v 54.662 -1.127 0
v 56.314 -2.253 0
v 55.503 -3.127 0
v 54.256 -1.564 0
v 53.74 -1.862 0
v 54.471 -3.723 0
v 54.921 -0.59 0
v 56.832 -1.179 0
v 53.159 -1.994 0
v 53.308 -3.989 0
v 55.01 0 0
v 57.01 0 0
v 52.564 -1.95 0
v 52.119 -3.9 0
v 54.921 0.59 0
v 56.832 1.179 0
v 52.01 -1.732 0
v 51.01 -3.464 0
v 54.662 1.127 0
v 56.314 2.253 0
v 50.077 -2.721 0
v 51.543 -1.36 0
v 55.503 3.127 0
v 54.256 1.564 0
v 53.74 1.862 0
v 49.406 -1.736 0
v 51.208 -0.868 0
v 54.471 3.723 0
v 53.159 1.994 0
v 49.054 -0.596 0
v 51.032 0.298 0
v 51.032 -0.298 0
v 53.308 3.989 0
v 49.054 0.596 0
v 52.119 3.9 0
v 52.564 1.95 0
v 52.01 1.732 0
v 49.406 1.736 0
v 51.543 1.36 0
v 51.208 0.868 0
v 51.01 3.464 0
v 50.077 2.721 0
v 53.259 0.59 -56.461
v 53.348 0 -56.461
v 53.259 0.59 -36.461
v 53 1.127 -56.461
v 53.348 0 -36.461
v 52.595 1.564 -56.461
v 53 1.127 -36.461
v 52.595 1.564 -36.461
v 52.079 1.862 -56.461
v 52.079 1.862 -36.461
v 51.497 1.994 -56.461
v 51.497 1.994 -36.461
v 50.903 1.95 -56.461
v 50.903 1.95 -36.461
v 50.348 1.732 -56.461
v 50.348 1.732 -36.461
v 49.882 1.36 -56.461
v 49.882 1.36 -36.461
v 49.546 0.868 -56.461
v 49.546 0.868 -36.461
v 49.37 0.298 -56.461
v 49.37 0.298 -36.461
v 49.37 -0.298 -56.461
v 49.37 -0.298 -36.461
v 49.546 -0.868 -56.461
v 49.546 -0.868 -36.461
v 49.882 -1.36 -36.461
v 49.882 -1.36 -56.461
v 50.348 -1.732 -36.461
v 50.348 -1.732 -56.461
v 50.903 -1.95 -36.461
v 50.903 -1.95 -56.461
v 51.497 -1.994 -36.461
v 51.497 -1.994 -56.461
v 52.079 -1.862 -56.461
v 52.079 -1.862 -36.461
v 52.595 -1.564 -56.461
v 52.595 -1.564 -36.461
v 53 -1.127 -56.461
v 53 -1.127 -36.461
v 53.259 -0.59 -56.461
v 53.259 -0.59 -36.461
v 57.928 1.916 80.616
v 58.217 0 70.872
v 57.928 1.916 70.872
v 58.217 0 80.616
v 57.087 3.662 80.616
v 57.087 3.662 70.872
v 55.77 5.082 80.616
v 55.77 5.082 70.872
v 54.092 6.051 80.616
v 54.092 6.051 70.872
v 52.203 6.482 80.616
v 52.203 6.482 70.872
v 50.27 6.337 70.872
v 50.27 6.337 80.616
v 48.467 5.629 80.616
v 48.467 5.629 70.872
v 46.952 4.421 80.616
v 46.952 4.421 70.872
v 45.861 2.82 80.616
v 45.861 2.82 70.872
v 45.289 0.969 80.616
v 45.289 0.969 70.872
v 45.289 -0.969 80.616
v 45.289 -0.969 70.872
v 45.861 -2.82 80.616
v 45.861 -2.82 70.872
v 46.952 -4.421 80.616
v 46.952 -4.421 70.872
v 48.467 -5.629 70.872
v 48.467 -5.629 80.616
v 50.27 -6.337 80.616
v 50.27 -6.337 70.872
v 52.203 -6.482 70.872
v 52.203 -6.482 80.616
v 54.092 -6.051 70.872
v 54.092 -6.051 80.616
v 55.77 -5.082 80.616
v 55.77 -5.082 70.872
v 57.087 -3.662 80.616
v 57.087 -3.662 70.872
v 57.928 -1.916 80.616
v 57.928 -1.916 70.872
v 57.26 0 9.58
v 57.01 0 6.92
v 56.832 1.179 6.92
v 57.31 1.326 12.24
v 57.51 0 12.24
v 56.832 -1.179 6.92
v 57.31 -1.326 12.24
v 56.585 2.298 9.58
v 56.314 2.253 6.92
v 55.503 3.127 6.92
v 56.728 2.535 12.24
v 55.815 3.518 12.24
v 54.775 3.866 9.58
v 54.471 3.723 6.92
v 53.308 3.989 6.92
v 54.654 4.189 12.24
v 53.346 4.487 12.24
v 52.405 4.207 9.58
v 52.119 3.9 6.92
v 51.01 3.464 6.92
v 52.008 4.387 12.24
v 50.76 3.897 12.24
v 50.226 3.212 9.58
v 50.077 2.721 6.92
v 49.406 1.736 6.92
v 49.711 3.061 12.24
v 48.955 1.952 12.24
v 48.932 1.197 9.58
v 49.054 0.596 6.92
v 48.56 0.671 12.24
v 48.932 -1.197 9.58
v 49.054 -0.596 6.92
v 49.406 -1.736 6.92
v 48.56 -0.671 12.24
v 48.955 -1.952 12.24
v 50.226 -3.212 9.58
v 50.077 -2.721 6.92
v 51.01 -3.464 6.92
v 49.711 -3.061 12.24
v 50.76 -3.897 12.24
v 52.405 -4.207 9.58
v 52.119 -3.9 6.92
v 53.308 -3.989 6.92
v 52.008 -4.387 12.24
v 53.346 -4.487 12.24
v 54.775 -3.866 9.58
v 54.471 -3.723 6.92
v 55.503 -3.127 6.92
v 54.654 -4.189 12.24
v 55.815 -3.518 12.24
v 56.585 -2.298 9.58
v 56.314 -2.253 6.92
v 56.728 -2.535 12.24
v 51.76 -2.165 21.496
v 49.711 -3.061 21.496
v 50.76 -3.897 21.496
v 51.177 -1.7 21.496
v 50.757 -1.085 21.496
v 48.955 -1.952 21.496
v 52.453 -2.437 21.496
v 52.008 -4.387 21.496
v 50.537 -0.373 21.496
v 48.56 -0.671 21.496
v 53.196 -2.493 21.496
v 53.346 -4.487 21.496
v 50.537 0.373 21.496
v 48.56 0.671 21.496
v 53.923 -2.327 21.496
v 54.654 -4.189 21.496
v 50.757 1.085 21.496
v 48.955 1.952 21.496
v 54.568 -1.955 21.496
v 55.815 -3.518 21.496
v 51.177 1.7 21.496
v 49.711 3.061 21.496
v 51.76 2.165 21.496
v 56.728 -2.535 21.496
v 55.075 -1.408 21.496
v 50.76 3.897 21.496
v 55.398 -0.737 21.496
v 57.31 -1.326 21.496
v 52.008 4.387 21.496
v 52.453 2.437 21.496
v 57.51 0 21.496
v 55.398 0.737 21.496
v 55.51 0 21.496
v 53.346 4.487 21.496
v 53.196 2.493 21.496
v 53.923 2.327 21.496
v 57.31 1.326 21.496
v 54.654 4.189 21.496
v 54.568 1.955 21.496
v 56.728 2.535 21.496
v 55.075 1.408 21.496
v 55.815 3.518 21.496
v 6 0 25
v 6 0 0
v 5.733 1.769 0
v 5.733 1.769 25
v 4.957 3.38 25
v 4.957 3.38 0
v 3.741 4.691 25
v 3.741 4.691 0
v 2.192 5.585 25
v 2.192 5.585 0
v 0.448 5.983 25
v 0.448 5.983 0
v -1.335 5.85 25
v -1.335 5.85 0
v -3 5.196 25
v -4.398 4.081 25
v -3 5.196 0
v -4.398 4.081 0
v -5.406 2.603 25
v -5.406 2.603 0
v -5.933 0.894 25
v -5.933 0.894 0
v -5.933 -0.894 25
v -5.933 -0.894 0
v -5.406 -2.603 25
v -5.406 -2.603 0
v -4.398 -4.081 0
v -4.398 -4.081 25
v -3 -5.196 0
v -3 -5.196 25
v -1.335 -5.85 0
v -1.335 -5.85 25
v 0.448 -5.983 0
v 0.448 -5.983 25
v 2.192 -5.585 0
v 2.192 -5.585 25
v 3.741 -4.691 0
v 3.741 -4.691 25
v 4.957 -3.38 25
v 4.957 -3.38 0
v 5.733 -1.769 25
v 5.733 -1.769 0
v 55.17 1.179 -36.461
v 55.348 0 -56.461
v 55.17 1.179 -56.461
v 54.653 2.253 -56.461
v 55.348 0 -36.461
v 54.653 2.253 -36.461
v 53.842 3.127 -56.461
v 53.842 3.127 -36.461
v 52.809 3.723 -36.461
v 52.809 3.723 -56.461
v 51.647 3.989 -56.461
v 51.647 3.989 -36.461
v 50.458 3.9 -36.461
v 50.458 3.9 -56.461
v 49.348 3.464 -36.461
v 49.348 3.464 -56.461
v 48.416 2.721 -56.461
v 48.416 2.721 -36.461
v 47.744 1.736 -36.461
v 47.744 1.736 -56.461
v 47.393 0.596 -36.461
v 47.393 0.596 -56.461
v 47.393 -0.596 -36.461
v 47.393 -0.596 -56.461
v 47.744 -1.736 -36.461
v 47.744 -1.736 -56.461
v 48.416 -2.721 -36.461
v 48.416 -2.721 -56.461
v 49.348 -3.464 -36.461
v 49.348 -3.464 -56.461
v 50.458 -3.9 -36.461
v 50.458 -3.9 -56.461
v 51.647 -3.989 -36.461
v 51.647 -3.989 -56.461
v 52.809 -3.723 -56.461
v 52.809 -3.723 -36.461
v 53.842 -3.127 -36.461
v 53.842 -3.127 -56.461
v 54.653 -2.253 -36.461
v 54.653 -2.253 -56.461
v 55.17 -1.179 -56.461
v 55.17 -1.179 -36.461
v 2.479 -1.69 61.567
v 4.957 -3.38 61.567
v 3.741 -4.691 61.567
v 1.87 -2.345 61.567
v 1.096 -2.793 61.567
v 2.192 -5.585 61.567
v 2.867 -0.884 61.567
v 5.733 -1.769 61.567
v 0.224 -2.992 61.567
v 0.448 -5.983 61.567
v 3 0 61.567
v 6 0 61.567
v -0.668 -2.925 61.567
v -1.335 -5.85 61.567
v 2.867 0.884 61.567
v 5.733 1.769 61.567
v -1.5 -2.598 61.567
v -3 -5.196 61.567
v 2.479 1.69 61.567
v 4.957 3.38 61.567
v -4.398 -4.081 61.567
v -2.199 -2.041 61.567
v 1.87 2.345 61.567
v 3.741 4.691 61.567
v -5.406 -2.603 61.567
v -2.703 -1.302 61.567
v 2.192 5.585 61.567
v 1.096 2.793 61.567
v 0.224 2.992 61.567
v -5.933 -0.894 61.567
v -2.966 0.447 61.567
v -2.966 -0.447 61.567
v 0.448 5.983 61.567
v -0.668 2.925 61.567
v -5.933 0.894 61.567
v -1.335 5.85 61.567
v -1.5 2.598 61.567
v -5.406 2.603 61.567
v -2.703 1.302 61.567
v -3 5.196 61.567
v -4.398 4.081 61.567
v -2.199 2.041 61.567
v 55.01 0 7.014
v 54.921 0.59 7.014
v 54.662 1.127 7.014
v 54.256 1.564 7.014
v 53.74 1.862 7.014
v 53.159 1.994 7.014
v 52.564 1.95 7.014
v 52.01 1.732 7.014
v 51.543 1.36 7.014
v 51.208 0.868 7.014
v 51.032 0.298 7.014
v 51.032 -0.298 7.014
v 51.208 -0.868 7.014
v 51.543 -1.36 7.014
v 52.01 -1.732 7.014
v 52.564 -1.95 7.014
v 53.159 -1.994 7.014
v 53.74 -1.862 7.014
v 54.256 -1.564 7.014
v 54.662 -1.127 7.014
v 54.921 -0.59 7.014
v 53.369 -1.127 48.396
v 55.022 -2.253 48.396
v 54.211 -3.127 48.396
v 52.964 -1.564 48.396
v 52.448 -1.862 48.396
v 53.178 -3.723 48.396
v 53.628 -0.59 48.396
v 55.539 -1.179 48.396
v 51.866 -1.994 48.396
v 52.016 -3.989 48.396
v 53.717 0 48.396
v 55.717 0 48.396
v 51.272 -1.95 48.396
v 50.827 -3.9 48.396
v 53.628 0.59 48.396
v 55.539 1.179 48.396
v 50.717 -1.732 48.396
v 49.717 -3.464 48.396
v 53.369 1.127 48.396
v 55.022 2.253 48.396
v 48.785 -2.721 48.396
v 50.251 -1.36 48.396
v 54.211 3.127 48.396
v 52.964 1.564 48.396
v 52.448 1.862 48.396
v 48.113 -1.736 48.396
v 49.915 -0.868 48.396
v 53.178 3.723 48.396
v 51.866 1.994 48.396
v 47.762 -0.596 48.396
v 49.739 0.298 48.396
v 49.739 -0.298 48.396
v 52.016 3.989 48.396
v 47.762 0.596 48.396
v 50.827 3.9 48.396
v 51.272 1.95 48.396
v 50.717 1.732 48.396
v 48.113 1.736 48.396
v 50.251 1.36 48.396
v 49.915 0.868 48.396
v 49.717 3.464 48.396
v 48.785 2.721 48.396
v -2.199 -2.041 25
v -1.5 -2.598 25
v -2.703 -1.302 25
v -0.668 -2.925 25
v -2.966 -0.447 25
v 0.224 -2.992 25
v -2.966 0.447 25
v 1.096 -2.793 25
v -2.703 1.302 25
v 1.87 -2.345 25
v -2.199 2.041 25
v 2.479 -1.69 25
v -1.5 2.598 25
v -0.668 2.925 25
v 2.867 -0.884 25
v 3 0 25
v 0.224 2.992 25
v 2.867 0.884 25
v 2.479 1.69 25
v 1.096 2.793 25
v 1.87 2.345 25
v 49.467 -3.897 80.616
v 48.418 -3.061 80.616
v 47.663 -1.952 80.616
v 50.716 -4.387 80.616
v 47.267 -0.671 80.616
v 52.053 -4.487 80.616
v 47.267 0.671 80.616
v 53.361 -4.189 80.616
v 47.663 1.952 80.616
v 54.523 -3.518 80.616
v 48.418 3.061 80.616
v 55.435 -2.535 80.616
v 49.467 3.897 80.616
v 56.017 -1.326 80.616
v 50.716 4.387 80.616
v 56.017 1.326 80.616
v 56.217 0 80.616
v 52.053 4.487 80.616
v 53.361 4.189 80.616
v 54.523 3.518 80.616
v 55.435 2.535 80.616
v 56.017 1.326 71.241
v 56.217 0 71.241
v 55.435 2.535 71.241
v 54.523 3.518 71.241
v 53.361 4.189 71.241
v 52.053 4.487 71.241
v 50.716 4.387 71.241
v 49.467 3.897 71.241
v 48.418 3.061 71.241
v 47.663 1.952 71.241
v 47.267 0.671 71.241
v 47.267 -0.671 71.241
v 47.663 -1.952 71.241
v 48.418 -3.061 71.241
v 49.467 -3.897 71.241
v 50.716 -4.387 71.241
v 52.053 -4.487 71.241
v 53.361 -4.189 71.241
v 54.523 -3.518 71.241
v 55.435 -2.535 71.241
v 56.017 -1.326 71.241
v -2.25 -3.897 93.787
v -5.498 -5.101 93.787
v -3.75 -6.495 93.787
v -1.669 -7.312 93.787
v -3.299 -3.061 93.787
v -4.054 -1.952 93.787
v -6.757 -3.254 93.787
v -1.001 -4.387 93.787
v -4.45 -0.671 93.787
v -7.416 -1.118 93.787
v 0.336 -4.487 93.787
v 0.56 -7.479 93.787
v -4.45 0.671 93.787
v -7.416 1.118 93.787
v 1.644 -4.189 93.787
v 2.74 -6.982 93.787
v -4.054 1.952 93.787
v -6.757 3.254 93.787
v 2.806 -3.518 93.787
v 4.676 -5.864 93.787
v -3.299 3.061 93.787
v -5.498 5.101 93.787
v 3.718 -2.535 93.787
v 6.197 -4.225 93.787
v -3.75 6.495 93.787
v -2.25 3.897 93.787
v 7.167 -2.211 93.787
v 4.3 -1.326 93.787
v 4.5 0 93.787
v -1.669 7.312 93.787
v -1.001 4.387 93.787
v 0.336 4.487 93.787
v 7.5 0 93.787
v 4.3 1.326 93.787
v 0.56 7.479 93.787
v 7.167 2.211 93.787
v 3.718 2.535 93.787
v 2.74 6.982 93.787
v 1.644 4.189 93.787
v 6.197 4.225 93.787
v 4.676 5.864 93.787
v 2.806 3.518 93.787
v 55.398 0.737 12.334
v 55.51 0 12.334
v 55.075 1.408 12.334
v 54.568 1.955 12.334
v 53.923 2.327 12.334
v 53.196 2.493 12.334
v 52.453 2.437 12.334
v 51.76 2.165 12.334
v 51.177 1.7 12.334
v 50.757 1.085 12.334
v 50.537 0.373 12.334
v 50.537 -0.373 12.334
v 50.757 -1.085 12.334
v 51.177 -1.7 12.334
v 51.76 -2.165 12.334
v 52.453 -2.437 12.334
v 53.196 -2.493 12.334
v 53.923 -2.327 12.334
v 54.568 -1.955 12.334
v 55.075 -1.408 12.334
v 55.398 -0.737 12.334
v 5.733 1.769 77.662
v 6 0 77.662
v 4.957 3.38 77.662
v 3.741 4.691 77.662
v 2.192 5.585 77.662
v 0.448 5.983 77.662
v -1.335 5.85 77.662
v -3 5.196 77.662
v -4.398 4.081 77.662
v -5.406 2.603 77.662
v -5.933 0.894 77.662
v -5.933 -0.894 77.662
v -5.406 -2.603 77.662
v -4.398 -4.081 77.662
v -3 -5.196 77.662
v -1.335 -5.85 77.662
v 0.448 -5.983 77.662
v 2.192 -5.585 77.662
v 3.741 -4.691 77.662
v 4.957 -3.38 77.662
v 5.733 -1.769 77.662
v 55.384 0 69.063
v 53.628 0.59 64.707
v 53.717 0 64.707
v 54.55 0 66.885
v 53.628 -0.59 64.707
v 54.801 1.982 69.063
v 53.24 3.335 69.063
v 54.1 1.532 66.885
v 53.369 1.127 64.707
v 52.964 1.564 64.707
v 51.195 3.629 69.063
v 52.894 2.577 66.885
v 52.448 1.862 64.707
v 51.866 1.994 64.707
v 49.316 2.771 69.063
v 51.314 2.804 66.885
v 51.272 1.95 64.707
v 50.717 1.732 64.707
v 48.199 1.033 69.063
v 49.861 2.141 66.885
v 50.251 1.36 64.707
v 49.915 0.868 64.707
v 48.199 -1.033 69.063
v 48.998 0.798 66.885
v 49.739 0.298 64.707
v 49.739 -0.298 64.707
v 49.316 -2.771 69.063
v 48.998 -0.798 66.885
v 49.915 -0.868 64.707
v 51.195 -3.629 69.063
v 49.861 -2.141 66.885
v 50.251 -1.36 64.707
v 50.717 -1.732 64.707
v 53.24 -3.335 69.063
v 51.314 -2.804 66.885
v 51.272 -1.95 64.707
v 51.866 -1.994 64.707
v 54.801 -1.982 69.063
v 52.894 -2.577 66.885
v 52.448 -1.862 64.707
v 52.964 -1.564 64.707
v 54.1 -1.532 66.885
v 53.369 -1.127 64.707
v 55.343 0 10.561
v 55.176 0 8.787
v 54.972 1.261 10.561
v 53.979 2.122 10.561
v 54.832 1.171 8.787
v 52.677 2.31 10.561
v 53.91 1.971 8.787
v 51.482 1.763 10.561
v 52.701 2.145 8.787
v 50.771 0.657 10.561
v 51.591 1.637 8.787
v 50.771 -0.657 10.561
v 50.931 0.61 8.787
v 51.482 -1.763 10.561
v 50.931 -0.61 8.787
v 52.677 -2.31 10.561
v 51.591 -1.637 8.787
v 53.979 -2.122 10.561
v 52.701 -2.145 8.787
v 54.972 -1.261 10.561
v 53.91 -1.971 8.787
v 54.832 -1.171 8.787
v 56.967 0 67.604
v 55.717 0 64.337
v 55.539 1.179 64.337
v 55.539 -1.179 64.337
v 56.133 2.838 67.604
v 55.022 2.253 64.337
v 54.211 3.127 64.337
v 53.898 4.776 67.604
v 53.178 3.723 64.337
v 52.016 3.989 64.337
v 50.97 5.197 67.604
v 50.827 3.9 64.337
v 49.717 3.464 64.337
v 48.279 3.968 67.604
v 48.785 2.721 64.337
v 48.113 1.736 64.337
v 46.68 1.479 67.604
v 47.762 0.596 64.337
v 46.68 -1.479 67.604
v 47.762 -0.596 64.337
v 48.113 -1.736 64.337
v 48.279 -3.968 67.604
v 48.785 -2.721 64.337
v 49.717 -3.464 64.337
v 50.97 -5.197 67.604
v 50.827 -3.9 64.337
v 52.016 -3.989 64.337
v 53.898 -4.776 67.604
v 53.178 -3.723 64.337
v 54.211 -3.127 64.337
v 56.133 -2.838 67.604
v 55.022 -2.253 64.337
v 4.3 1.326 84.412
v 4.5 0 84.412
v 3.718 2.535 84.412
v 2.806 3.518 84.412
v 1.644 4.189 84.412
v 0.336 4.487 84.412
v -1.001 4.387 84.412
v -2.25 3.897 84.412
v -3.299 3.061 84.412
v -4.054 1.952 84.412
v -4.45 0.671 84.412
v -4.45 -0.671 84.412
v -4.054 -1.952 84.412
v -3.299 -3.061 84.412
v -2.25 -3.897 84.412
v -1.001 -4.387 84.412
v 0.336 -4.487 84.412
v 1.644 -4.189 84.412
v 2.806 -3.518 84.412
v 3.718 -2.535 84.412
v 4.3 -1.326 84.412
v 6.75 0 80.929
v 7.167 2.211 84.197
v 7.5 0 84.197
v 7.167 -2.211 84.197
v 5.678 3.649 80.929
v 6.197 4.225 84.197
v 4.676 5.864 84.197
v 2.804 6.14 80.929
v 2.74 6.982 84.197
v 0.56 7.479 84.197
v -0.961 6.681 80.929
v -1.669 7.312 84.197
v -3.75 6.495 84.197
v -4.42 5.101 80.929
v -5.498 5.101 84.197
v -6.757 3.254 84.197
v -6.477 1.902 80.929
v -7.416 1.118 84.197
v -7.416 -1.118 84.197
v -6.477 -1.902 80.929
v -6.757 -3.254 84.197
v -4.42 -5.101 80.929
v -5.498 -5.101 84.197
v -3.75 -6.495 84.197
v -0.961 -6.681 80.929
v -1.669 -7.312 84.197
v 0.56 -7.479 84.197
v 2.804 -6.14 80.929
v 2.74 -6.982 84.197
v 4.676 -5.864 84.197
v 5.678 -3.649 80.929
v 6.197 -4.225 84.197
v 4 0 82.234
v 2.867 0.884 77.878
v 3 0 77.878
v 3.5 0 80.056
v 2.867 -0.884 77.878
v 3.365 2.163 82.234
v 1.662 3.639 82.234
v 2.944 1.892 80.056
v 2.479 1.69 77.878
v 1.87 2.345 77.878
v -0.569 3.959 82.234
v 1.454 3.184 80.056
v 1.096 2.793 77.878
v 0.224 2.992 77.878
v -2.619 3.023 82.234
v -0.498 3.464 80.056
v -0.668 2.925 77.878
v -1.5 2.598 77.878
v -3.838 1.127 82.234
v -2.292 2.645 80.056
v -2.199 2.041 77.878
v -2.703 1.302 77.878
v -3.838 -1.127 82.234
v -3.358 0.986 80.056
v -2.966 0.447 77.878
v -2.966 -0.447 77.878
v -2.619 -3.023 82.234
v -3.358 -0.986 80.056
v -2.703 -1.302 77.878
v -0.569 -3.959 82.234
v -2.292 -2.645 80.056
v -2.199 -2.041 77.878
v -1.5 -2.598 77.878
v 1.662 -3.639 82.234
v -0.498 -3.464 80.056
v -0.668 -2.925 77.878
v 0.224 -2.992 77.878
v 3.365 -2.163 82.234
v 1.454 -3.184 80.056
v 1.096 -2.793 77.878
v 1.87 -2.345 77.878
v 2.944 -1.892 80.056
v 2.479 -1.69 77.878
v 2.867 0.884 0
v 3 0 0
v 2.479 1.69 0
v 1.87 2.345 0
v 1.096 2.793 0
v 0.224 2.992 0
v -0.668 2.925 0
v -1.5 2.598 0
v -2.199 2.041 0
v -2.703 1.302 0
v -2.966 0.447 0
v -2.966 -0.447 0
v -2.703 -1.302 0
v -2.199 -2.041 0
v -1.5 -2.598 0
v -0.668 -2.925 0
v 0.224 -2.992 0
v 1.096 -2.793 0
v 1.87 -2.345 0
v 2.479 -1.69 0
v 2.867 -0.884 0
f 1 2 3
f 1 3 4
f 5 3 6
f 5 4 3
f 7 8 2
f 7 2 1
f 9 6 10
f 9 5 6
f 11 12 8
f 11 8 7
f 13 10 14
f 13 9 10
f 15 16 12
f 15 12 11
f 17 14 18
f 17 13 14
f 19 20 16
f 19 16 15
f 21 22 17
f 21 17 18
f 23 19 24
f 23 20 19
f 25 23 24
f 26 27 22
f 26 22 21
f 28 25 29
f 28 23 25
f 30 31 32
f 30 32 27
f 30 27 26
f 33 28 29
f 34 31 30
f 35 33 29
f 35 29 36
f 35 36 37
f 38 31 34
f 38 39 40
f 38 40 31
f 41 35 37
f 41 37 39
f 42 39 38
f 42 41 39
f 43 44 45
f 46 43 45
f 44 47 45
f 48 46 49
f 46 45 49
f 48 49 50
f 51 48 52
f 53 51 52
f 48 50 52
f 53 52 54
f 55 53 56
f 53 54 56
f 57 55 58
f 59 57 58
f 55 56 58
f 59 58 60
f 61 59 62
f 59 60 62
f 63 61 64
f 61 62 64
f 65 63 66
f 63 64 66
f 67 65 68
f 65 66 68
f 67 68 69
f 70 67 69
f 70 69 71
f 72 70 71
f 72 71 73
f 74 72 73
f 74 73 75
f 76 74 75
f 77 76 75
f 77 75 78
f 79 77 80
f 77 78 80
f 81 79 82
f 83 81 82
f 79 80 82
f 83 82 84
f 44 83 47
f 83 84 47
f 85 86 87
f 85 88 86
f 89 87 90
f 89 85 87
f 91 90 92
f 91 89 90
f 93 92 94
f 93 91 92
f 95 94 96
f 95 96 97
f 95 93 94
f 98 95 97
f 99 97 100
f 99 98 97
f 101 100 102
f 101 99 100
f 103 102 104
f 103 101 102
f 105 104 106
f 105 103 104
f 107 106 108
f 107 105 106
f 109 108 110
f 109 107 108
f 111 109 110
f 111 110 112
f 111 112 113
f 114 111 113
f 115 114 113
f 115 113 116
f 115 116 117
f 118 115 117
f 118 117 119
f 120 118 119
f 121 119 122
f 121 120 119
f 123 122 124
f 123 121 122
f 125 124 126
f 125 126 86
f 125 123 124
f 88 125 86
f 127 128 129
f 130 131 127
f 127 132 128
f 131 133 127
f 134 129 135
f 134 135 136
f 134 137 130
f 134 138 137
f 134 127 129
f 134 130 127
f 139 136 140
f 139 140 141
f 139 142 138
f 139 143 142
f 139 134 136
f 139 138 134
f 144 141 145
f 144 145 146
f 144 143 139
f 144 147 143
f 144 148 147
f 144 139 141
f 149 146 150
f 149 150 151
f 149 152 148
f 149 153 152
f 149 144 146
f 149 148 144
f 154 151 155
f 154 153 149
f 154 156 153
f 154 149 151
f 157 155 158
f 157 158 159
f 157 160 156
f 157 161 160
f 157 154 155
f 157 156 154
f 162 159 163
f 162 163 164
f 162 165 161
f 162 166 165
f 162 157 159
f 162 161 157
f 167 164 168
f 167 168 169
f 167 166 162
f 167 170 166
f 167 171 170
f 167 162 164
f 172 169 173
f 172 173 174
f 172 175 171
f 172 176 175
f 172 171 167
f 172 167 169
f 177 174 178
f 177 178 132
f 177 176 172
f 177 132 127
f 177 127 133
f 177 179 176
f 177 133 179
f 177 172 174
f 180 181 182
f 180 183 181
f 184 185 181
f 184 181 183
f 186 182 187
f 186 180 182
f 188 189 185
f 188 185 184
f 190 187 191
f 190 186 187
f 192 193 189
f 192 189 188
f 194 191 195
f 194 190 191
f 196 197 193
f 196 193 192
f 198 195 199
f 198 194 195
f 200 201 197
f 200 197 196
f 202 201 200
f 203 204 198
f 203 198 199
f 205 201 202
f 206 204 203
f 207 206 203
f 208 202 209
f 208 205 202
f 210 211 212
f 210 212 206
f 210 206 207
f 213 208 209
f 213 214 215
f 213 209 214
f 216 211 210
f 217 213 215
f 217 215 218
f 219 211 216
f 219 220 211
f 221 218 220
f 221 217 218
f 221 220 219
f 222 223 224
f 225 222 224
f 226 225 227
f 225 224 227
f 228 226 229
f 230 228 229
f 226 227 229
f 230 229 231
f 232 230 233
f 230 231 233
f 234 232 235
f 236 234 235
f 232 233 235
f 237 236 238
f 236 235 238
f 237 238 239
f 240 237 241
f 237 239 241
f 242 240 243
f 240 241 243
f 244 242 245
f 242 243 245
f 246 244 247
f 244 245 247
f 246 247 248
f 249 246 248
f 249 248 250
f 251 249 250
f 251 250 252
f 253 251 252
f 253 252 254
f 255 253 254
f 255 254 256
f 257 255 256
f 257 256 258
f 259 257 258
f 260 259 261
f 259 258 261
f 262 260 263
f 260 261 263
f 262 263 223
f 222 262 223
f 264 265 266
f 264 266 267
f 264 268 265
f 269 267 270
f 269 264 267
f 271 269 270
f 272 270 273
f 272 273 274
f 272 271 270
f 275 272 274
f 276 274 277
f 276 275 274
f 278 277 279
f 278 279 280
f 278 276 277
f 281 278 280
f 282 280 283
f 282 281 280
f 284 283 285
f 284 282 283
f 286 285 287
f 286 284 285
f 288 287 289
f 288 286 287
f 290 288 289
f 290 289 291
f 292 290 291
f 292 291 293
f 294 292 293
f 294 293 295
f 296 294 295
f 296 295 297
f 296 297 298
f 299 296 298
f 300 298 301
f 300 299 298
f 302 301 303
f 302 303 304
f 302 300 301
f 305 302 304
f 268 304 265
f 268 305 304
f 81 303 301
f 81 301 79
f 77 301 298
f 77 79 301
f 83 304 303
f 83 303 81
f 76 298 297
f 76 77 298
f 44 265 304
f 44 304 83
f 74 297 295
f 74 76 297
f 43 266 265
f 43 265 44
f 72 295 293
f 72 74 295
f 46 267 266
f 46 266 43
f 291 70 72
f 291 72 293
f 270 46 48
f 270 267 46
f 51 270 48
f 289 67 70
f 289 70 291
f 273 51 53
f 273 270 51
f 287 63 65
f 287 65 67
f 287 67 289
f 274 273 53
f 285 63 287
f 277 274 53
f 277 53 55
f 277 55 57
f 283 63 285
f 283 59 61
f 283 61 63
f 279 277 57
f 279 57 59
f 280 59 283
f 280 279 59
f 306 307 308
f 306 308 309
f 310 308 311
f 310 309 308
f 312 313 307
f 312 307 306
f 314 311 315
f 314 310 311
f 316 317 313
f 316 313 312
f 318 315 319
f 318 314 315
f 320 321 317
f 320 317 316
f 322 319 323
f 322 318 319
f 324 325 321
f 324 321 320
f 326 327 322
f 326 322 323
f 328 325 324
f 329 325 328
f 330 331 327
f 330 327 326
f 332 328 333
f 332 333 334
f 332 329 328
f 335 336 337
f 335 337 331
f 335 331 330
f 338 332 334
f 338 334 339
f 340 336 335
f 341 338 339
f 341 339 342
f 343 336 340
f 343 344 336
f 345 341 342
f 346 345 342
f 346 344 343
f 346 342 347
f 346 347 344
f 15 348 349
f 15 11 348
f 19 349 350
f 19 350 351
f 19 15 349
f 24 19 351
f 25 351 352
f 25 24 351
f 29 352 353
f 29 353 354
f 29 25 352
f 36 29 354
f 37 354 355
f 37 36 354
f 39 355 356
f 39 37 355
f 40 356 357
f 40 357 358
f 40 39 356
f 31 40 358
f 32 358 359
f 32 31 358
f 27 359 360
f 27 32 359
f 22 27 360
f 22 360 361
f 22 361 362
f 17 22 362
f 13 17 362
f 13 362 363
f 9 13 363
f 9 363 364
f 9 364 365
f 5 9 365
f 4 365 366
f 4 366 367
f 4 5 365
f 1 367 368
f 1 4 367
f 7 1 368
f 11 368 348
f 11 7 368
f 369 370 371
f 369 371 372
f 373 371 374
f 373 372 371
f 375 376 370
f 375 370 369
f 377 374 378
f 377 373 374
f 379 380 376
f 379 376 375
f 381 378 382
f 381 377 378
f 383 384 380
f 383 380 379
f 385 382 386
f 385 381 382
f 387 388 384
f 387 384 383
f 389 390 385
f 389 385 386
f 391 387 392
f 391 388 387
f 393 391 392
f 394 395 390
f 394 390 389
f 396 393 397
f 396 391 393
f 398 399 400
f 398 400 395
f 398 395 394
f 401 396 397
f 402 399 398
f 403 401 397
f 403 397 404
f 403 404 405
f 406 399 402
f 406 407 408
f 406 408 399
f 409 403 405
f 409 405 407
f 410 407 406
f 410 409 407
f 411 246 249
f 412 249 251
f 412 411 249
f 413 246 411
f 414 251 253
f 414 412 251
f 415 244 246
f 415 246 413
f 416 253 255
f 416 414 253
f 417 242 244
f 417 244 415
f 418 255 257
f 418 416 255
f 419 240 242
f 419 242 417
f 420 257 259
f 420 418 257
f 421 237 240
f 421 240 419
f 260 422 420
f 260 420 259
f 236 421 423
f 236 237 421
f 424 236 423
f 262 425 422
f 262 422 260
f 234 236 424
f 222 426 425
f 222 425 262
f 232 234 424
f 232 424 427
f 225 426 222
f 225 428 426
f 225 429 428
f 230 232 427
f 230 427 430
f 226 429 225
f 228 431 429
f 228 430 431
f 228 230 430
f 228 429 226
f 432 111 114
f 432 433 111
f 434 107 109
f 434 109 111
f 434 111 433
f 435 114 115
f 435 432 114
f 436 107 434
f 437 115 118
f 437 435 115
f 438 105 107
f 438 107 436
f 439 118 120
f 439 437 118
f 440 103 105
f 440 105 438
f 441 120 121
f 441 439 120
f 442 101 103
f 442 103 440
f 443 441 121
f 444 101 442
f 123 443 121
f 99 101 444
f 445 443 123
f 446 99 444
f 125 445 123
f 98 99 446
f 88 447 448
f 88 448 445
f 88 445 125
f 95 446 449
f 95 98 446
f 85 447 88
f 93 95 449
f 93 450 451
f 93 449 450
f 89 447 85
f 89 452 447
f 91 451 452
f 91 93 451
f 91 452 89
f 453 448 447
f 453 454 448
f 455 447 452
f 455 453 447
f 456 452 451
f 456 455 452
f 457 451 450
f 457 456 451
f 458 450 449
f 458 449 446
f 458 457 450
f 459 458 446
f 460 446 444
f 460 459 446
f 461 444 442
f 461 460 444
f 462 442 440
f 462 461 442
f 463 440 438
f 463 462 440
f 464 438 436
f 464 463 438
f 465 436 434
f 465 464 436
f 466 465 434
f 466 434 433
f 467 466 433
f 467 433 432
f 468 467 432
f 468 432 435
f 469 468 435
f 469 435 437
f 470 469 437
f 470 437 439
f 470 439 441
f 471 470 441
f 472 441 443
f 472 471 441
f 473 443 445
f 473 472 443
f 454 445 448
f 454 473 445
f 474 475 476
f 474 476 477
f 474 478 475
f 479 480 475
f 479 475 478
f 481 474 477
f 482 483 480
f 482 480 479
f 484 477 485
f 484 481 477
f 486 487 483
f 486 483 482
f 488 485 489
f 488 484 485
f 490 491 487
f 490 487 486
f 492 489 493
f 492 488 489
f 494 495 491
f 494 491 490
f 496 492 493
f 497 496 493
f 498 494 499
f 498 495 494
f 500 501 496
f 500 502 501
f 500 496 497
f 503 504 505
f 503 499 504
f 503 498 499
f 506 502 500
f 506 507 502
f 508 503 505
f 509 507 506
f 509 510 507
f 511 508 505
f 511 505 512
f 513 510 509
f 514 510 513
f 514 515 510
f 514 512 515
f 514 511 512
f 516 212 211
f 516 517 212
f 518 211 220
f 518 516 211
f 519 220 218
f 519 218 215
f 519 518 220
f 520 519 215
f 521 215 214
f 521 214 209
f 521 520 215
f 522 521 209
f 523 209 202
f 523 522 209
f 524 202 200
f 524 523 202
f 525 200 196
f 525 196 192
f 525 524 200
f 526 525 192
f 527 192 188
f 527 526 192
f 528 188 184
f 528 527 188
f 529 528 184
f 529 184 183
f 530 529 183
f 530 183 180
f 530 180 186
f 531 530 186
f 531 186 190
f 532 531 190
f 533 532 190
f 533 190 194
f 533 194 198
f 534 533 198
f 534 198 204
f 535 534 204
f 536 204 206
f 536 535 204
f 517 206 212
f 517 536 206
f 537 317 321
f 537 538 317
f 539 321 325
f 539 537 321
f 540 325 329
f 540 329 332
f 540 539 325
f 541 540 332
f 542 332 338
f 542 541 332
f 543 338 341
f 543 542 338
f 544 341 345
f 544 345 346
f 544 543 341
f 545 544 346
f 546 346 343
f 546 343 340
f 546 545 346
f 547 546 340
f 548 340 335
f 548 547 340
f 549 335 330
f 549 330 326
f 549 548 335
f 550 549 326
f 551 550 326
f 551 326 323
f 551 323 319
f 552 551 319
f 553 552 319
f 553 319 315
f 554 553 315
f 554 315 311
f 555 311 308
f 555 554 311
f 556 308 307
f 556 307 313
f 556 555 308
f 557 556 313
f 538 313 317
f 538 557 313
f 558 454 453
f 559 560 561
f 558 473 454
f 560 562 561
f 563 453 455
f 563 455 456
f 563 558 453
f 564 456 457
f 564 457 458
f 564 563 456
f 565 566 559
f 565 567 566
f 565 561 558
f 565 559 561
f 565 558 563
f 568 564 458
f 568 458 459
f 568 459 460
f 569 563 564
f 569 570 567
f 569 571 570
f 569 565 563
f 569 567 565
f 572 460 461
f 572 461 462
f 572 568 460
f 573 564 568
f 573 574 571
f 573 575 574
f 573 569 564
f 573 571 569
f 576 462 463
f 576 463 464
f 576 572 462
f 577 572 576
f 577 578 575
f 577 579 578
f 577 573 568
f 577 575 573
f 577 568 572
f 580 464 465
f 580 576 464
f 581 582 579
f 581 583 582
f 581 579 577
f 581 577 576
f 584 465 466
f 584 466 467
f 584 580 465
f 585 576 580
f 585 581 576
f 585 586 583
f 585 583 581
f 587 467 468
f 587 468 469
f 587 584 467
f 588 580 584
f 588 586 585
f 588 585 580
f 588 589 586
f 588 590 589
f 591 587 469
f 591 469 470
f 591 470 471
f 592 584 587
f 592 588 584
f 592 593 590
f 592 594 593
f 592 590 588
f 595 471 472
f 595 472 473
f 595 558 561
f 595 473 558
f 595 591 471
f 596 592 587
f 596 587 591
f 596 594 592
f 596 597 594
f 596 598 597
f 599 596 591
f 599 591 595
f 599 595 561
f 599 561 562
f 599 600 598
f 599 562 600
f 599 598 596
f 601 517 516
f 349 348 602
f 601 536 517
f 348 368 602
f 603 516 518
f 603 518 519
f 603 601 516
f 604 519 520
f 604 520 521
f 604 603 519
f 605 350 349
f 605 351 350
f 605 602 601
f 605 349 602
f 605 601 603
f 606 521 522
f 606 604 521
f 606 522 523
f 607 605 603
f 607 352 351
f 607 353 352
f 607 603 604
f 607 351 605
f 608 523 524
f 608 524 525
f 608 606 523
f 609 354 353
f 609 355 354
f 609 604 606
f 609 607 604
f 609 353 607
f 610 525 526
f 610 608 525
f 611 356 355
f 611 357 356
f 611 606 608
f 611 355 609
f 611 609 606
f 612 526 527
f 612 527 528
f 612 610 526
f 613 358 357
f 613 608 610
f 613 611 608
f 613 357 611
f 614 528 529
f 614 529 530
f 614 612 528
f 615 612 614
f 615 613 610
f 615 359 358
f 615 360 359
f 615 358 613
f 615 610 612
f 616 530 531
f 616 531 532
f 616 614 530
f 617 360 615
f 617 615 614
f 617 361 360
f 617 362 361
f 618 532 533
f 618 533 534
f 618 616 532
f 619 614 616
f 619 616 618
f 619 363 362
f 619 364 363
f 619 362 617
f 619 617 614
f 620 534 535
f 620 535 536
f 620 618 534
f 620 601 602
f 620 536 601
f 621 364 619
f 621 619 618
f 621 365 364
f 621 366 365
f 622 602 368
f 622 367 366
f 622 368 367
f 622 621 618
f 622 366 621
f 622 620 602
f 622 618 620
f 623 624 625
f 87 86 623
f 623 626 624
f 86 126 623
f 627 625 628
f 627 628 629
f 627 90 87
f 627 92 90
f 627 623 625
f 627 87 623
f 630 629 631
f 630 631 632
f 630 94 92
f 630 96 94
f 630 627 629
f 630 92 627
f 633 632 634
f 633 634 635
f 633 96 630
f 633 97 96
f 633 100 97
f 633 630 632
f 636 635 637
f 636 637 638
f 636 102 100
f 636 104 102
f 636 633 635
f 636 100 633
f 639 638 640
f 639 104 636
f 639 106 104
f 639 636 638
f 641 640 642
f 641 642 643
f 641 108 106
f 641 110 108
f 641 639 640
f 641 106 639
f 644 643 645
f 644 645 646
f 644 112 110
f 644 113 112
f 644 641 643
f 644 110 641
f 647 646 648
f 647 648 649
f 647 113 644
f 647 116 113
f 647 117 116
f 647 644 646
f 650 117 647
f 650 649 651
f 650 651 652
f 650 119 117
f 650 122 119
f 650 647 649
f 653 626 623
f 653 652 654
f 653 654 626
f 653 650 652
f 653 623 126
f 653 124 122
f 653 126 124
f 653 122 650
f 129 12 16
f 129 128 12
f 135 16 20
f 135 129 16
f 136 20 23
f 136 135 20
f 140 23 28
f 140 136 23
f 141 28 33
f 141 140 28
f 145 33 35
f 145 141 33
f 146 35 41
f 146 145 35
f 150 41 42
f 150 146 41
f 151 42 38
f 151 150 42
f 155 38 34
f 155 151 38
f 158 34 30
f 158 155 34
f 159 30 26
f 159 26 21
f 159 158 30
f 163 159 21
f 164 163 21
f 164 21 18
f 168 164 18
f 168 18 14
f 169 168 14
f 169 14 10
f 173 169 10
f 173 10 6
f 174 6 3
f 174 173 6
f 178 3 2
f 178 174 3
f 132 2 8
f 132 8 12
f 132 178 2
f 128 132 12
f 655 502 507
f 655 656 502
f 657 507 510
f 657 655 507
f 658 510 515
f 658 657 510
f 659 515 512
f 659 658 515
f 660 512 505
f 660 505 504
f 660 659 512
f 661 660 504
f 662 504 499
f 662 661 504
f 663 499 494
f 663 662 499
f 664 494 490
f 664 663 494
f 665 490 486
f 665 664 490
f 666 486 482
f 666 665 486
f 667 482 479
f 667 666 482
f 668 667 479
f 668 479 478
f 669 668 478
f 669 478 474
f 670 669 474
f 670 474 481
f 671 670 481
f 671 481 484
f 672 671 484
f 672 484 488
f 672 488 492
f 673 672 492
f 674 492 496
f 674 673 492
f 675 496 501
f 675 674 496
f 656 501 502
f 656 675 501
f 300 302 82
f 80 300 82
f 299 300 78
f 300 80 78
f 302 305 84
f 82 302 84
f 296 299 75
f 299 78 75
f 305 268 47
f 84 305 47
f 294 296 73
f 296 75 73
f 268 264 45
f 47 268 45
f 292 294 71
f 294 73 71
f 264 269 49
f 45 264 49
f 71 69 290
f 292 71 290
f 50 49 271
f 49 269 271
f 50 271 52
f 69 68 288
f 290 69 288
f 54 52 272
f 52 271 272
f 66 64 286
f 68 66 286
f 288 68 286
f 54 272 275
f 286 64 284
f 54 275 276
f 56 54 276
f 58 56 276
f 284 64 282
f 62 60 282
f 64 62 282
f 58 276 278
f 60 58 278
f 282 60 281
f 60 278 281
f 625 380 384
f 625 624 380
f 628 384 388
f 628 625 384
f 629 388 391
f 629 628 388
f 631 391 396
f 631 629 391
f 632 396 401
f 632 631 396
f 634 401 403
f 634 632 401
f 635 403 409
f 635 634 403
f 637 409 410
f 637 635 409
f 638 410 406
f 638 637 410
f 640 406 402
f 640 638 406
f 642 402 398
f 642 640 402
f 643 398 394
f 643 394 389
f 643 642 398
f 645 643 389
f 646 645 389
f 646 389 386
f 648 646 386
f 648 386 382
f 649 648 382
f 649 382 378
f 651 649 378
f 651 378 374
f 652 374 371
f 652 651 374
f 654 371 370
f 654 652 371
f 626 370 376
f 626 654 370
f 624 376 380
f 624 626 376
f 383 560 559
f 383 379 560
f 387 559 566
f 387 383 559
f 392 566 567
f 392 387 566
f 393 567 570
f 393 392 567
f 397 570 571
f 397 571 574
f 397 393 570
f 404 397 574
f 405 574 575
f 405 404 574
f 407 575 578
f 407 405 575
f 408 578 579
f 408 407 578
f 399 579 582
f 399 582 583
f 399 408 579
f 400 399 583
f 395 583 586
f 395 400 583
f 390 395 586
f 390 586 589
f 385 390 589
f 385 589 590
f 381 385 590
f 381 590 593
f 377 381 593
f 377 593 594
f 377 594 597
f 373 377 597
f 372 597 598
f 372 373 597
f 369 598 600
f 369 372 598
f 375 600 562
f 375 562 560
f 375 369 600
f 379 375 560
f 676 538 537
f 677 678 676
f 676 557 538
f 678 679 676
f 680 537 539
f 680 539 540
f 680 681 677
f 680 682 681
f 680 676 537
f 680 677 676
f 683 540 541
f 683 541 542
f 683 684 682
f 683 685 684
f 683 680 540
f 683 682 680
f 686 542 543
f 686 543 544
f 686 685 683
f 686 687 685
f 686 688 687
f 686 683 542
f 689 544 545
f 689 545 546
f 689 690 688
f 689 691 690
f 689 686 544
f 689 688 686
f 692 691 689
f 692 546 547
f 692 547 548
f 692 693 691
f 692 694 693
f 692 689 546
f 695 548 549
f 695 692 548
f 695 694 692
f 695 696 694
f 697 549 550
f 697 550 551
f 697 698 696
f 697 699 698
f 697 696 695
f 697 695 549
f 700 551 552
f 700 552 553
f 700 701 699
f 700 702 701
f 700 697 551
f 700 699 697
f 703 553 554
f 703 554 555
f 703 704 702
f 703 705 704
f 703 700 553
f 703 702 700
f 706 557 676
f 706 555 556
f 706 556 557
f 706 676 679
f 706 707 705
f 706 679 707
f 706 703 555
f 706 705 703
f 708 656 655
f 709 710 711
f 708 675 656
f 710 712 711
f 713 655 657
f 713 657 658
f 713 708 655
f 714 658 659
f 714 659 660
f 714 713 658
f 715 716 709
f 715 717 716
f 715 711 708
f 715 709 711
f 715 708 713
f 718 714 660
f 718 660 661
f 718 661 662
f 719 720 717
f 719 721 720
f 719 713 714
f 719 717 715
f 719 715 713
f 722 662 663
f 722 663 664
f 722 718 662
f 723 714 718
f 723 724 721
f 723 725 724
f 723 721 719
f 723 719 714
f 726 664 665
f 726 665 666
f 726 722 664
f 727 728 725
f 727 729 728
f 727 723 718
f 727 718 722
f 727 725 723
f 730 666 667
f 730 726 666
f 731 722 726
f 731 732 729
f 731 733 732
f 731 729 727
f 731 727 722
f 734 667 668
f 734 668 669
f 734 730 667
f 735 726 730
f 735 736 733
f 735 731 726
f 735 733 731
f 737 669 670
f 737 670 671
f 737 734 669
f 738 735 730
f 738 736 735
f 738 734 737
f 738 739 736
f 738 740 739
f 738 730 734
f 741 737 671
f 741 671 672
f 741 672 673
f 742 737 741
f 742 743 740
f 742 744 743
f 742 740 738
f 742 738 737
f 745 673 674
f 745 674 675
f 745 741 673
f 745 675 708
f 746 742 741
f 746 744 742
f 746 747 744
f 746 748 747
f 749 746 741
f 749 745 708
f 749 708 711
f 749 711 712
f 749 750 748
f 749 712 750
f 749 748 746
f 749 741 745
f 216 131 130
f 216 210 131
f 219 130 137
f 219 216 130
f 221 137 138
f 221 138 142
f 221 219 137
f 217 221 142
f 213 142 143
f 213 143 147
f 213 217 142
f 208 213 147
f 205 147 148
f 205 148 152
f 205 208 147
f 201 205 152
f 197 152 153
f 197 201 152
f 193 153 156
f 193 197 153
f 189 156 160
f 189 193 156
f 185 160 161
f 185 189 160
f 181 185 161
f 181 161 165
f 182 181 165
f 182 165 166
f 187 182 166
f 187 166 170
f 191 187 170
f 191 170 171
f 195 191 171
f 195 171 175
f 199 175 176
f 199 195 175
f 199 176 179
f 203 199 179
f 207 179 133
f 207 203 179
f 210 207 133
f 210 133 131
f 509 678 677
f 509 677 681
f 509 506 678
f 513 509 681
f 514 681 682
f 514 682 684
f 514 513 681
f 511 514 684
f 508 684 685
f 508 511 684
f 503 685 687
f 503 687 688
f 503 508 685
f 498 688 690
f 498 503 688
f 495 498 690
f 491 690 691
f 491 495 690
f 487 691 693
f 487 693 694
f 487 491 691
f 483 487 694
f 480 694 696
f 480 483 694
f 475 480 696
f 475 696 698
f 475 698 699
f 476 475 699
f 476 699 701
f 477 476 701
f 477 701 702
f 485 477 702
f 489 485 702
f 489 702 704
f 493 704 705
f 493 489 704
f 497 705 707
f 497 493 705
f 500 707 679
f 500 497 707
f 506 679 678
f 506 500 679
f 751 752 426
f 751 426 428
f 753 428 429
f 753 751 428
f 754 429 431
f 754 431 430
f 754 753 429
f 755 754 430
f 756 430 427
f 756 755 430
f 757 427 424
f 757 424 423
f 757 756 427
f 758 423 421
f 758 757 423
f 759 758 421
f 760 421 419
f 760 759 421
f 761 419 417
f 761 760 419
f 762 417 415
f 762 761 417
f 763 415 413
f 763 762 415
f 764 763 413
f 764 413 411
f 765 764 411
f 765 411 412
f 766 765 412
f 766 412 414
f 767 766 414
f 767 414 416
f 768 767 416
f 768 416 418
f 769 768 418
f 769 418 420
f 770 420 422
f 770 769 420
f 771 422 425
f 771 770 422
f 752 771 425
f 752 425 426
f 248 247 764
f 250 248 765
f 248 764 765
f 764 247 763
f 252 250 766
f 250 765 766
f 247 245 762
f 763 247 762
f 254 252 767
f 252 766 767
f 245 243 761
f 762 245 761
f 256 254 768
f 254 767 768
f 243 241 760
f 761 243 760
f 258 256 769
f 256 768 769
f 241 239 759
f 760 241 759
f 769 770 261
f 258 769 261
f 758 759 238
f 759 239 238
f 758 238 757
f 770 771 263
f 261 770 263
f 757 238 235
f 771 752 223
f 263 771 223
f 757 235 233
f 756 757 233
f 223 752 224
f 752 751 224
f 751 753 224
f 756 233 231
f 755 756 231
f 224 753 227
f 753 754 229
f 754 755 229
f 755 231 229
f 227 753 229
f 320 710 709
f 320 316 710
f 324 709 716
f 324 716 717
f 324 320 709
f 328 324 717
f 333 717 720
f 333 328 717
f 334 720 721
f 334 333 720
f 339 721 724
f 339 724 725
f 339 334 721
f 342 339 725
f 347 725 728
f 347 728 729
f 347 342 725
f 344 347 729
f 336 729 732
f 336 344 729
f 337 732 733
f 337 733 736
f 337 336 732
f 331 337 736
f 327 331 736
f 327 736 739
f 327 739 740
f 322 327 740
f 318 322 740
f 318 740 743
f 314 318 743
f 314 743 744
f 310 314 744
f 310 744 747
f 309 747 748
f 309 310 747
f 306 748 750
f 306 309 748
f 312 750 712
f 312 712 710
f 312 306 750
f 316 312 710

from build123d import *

# Parameters (mm, degrees)
F0_R     = 6
F0_R_2   = 3
F1_DEPTH = 25
F8_W     = 2
F8_H     = 20


with BuildPart() as f1:
    # F0 (on Top) → F1 (new body)
    with BuildSketch(Plane.XY):
        Circle(F0_R)
        Circle(F0_R_2, mode=Mode.SUBTRACT)
    extrude(amount=F1_DEPTH)


with BuildPart() as f3:
    # F2 (on Front) → F3 (revolve)
    with BuildSketch(Plane.XZ):
        Polygon((3, 77.877599), (3, 61.567154), (6, 61.567154), (6, 77.662082), (7.5, 84.196567), (7.5, 93.787088), (4.5, 93.787088), (4.5, 84.412084), align=None)
    revolve(axis=Axis((0, 0, 78.798079), (0, 0, 1)))


with BuildPart() as f5:
    # F4 (on Front) → F5 (revolve)
    with BuildSketch(Plane.XZ):
        Polygon((53.716872, 64.706706), (53.716872, 48.396261), (55.716872, 48.396261), (55.716872, 64.33718), (58.216871, 70.871666), (58.216871, 80.616195), (56.216871, 80.616195), (56.216871, 71.241191), align=None)
    revolve(axis=Axis((51.716872, 0, 65.627186), (0, 0, 1)))


with BuildPart() as f7:
    # F6 (on Front) → F7 (revolve)
    with BuildSketch(Plane.XZ):
        Polygon((55.009512, 7.01401), (55.009512, 0), (57.009512, 0), (57.009512, 6.92023), (57.509512, 12.240107), (57.509512, 21.496255), (55.509512, 21.496255), (55.509512, 12.333888), align=None)
    revolve(axis=Axis((53.009512, 0, 17.230925), (0, 0, 1)))


with BuildPart() as f9:
    # F8 (on Front) → F9 (revolve)
    with BuildSketch(Plane.XZ):
        with Locations((54.347832, -46.461293)):
            Rectangle(F8_W, F8_H)
    revolve(axis=Axis((51.347832, 0, -39.230368), (0, 0, 1)))


solid = Compound([f1.part, f3.part, f5.part, f7.part, f9.part])
